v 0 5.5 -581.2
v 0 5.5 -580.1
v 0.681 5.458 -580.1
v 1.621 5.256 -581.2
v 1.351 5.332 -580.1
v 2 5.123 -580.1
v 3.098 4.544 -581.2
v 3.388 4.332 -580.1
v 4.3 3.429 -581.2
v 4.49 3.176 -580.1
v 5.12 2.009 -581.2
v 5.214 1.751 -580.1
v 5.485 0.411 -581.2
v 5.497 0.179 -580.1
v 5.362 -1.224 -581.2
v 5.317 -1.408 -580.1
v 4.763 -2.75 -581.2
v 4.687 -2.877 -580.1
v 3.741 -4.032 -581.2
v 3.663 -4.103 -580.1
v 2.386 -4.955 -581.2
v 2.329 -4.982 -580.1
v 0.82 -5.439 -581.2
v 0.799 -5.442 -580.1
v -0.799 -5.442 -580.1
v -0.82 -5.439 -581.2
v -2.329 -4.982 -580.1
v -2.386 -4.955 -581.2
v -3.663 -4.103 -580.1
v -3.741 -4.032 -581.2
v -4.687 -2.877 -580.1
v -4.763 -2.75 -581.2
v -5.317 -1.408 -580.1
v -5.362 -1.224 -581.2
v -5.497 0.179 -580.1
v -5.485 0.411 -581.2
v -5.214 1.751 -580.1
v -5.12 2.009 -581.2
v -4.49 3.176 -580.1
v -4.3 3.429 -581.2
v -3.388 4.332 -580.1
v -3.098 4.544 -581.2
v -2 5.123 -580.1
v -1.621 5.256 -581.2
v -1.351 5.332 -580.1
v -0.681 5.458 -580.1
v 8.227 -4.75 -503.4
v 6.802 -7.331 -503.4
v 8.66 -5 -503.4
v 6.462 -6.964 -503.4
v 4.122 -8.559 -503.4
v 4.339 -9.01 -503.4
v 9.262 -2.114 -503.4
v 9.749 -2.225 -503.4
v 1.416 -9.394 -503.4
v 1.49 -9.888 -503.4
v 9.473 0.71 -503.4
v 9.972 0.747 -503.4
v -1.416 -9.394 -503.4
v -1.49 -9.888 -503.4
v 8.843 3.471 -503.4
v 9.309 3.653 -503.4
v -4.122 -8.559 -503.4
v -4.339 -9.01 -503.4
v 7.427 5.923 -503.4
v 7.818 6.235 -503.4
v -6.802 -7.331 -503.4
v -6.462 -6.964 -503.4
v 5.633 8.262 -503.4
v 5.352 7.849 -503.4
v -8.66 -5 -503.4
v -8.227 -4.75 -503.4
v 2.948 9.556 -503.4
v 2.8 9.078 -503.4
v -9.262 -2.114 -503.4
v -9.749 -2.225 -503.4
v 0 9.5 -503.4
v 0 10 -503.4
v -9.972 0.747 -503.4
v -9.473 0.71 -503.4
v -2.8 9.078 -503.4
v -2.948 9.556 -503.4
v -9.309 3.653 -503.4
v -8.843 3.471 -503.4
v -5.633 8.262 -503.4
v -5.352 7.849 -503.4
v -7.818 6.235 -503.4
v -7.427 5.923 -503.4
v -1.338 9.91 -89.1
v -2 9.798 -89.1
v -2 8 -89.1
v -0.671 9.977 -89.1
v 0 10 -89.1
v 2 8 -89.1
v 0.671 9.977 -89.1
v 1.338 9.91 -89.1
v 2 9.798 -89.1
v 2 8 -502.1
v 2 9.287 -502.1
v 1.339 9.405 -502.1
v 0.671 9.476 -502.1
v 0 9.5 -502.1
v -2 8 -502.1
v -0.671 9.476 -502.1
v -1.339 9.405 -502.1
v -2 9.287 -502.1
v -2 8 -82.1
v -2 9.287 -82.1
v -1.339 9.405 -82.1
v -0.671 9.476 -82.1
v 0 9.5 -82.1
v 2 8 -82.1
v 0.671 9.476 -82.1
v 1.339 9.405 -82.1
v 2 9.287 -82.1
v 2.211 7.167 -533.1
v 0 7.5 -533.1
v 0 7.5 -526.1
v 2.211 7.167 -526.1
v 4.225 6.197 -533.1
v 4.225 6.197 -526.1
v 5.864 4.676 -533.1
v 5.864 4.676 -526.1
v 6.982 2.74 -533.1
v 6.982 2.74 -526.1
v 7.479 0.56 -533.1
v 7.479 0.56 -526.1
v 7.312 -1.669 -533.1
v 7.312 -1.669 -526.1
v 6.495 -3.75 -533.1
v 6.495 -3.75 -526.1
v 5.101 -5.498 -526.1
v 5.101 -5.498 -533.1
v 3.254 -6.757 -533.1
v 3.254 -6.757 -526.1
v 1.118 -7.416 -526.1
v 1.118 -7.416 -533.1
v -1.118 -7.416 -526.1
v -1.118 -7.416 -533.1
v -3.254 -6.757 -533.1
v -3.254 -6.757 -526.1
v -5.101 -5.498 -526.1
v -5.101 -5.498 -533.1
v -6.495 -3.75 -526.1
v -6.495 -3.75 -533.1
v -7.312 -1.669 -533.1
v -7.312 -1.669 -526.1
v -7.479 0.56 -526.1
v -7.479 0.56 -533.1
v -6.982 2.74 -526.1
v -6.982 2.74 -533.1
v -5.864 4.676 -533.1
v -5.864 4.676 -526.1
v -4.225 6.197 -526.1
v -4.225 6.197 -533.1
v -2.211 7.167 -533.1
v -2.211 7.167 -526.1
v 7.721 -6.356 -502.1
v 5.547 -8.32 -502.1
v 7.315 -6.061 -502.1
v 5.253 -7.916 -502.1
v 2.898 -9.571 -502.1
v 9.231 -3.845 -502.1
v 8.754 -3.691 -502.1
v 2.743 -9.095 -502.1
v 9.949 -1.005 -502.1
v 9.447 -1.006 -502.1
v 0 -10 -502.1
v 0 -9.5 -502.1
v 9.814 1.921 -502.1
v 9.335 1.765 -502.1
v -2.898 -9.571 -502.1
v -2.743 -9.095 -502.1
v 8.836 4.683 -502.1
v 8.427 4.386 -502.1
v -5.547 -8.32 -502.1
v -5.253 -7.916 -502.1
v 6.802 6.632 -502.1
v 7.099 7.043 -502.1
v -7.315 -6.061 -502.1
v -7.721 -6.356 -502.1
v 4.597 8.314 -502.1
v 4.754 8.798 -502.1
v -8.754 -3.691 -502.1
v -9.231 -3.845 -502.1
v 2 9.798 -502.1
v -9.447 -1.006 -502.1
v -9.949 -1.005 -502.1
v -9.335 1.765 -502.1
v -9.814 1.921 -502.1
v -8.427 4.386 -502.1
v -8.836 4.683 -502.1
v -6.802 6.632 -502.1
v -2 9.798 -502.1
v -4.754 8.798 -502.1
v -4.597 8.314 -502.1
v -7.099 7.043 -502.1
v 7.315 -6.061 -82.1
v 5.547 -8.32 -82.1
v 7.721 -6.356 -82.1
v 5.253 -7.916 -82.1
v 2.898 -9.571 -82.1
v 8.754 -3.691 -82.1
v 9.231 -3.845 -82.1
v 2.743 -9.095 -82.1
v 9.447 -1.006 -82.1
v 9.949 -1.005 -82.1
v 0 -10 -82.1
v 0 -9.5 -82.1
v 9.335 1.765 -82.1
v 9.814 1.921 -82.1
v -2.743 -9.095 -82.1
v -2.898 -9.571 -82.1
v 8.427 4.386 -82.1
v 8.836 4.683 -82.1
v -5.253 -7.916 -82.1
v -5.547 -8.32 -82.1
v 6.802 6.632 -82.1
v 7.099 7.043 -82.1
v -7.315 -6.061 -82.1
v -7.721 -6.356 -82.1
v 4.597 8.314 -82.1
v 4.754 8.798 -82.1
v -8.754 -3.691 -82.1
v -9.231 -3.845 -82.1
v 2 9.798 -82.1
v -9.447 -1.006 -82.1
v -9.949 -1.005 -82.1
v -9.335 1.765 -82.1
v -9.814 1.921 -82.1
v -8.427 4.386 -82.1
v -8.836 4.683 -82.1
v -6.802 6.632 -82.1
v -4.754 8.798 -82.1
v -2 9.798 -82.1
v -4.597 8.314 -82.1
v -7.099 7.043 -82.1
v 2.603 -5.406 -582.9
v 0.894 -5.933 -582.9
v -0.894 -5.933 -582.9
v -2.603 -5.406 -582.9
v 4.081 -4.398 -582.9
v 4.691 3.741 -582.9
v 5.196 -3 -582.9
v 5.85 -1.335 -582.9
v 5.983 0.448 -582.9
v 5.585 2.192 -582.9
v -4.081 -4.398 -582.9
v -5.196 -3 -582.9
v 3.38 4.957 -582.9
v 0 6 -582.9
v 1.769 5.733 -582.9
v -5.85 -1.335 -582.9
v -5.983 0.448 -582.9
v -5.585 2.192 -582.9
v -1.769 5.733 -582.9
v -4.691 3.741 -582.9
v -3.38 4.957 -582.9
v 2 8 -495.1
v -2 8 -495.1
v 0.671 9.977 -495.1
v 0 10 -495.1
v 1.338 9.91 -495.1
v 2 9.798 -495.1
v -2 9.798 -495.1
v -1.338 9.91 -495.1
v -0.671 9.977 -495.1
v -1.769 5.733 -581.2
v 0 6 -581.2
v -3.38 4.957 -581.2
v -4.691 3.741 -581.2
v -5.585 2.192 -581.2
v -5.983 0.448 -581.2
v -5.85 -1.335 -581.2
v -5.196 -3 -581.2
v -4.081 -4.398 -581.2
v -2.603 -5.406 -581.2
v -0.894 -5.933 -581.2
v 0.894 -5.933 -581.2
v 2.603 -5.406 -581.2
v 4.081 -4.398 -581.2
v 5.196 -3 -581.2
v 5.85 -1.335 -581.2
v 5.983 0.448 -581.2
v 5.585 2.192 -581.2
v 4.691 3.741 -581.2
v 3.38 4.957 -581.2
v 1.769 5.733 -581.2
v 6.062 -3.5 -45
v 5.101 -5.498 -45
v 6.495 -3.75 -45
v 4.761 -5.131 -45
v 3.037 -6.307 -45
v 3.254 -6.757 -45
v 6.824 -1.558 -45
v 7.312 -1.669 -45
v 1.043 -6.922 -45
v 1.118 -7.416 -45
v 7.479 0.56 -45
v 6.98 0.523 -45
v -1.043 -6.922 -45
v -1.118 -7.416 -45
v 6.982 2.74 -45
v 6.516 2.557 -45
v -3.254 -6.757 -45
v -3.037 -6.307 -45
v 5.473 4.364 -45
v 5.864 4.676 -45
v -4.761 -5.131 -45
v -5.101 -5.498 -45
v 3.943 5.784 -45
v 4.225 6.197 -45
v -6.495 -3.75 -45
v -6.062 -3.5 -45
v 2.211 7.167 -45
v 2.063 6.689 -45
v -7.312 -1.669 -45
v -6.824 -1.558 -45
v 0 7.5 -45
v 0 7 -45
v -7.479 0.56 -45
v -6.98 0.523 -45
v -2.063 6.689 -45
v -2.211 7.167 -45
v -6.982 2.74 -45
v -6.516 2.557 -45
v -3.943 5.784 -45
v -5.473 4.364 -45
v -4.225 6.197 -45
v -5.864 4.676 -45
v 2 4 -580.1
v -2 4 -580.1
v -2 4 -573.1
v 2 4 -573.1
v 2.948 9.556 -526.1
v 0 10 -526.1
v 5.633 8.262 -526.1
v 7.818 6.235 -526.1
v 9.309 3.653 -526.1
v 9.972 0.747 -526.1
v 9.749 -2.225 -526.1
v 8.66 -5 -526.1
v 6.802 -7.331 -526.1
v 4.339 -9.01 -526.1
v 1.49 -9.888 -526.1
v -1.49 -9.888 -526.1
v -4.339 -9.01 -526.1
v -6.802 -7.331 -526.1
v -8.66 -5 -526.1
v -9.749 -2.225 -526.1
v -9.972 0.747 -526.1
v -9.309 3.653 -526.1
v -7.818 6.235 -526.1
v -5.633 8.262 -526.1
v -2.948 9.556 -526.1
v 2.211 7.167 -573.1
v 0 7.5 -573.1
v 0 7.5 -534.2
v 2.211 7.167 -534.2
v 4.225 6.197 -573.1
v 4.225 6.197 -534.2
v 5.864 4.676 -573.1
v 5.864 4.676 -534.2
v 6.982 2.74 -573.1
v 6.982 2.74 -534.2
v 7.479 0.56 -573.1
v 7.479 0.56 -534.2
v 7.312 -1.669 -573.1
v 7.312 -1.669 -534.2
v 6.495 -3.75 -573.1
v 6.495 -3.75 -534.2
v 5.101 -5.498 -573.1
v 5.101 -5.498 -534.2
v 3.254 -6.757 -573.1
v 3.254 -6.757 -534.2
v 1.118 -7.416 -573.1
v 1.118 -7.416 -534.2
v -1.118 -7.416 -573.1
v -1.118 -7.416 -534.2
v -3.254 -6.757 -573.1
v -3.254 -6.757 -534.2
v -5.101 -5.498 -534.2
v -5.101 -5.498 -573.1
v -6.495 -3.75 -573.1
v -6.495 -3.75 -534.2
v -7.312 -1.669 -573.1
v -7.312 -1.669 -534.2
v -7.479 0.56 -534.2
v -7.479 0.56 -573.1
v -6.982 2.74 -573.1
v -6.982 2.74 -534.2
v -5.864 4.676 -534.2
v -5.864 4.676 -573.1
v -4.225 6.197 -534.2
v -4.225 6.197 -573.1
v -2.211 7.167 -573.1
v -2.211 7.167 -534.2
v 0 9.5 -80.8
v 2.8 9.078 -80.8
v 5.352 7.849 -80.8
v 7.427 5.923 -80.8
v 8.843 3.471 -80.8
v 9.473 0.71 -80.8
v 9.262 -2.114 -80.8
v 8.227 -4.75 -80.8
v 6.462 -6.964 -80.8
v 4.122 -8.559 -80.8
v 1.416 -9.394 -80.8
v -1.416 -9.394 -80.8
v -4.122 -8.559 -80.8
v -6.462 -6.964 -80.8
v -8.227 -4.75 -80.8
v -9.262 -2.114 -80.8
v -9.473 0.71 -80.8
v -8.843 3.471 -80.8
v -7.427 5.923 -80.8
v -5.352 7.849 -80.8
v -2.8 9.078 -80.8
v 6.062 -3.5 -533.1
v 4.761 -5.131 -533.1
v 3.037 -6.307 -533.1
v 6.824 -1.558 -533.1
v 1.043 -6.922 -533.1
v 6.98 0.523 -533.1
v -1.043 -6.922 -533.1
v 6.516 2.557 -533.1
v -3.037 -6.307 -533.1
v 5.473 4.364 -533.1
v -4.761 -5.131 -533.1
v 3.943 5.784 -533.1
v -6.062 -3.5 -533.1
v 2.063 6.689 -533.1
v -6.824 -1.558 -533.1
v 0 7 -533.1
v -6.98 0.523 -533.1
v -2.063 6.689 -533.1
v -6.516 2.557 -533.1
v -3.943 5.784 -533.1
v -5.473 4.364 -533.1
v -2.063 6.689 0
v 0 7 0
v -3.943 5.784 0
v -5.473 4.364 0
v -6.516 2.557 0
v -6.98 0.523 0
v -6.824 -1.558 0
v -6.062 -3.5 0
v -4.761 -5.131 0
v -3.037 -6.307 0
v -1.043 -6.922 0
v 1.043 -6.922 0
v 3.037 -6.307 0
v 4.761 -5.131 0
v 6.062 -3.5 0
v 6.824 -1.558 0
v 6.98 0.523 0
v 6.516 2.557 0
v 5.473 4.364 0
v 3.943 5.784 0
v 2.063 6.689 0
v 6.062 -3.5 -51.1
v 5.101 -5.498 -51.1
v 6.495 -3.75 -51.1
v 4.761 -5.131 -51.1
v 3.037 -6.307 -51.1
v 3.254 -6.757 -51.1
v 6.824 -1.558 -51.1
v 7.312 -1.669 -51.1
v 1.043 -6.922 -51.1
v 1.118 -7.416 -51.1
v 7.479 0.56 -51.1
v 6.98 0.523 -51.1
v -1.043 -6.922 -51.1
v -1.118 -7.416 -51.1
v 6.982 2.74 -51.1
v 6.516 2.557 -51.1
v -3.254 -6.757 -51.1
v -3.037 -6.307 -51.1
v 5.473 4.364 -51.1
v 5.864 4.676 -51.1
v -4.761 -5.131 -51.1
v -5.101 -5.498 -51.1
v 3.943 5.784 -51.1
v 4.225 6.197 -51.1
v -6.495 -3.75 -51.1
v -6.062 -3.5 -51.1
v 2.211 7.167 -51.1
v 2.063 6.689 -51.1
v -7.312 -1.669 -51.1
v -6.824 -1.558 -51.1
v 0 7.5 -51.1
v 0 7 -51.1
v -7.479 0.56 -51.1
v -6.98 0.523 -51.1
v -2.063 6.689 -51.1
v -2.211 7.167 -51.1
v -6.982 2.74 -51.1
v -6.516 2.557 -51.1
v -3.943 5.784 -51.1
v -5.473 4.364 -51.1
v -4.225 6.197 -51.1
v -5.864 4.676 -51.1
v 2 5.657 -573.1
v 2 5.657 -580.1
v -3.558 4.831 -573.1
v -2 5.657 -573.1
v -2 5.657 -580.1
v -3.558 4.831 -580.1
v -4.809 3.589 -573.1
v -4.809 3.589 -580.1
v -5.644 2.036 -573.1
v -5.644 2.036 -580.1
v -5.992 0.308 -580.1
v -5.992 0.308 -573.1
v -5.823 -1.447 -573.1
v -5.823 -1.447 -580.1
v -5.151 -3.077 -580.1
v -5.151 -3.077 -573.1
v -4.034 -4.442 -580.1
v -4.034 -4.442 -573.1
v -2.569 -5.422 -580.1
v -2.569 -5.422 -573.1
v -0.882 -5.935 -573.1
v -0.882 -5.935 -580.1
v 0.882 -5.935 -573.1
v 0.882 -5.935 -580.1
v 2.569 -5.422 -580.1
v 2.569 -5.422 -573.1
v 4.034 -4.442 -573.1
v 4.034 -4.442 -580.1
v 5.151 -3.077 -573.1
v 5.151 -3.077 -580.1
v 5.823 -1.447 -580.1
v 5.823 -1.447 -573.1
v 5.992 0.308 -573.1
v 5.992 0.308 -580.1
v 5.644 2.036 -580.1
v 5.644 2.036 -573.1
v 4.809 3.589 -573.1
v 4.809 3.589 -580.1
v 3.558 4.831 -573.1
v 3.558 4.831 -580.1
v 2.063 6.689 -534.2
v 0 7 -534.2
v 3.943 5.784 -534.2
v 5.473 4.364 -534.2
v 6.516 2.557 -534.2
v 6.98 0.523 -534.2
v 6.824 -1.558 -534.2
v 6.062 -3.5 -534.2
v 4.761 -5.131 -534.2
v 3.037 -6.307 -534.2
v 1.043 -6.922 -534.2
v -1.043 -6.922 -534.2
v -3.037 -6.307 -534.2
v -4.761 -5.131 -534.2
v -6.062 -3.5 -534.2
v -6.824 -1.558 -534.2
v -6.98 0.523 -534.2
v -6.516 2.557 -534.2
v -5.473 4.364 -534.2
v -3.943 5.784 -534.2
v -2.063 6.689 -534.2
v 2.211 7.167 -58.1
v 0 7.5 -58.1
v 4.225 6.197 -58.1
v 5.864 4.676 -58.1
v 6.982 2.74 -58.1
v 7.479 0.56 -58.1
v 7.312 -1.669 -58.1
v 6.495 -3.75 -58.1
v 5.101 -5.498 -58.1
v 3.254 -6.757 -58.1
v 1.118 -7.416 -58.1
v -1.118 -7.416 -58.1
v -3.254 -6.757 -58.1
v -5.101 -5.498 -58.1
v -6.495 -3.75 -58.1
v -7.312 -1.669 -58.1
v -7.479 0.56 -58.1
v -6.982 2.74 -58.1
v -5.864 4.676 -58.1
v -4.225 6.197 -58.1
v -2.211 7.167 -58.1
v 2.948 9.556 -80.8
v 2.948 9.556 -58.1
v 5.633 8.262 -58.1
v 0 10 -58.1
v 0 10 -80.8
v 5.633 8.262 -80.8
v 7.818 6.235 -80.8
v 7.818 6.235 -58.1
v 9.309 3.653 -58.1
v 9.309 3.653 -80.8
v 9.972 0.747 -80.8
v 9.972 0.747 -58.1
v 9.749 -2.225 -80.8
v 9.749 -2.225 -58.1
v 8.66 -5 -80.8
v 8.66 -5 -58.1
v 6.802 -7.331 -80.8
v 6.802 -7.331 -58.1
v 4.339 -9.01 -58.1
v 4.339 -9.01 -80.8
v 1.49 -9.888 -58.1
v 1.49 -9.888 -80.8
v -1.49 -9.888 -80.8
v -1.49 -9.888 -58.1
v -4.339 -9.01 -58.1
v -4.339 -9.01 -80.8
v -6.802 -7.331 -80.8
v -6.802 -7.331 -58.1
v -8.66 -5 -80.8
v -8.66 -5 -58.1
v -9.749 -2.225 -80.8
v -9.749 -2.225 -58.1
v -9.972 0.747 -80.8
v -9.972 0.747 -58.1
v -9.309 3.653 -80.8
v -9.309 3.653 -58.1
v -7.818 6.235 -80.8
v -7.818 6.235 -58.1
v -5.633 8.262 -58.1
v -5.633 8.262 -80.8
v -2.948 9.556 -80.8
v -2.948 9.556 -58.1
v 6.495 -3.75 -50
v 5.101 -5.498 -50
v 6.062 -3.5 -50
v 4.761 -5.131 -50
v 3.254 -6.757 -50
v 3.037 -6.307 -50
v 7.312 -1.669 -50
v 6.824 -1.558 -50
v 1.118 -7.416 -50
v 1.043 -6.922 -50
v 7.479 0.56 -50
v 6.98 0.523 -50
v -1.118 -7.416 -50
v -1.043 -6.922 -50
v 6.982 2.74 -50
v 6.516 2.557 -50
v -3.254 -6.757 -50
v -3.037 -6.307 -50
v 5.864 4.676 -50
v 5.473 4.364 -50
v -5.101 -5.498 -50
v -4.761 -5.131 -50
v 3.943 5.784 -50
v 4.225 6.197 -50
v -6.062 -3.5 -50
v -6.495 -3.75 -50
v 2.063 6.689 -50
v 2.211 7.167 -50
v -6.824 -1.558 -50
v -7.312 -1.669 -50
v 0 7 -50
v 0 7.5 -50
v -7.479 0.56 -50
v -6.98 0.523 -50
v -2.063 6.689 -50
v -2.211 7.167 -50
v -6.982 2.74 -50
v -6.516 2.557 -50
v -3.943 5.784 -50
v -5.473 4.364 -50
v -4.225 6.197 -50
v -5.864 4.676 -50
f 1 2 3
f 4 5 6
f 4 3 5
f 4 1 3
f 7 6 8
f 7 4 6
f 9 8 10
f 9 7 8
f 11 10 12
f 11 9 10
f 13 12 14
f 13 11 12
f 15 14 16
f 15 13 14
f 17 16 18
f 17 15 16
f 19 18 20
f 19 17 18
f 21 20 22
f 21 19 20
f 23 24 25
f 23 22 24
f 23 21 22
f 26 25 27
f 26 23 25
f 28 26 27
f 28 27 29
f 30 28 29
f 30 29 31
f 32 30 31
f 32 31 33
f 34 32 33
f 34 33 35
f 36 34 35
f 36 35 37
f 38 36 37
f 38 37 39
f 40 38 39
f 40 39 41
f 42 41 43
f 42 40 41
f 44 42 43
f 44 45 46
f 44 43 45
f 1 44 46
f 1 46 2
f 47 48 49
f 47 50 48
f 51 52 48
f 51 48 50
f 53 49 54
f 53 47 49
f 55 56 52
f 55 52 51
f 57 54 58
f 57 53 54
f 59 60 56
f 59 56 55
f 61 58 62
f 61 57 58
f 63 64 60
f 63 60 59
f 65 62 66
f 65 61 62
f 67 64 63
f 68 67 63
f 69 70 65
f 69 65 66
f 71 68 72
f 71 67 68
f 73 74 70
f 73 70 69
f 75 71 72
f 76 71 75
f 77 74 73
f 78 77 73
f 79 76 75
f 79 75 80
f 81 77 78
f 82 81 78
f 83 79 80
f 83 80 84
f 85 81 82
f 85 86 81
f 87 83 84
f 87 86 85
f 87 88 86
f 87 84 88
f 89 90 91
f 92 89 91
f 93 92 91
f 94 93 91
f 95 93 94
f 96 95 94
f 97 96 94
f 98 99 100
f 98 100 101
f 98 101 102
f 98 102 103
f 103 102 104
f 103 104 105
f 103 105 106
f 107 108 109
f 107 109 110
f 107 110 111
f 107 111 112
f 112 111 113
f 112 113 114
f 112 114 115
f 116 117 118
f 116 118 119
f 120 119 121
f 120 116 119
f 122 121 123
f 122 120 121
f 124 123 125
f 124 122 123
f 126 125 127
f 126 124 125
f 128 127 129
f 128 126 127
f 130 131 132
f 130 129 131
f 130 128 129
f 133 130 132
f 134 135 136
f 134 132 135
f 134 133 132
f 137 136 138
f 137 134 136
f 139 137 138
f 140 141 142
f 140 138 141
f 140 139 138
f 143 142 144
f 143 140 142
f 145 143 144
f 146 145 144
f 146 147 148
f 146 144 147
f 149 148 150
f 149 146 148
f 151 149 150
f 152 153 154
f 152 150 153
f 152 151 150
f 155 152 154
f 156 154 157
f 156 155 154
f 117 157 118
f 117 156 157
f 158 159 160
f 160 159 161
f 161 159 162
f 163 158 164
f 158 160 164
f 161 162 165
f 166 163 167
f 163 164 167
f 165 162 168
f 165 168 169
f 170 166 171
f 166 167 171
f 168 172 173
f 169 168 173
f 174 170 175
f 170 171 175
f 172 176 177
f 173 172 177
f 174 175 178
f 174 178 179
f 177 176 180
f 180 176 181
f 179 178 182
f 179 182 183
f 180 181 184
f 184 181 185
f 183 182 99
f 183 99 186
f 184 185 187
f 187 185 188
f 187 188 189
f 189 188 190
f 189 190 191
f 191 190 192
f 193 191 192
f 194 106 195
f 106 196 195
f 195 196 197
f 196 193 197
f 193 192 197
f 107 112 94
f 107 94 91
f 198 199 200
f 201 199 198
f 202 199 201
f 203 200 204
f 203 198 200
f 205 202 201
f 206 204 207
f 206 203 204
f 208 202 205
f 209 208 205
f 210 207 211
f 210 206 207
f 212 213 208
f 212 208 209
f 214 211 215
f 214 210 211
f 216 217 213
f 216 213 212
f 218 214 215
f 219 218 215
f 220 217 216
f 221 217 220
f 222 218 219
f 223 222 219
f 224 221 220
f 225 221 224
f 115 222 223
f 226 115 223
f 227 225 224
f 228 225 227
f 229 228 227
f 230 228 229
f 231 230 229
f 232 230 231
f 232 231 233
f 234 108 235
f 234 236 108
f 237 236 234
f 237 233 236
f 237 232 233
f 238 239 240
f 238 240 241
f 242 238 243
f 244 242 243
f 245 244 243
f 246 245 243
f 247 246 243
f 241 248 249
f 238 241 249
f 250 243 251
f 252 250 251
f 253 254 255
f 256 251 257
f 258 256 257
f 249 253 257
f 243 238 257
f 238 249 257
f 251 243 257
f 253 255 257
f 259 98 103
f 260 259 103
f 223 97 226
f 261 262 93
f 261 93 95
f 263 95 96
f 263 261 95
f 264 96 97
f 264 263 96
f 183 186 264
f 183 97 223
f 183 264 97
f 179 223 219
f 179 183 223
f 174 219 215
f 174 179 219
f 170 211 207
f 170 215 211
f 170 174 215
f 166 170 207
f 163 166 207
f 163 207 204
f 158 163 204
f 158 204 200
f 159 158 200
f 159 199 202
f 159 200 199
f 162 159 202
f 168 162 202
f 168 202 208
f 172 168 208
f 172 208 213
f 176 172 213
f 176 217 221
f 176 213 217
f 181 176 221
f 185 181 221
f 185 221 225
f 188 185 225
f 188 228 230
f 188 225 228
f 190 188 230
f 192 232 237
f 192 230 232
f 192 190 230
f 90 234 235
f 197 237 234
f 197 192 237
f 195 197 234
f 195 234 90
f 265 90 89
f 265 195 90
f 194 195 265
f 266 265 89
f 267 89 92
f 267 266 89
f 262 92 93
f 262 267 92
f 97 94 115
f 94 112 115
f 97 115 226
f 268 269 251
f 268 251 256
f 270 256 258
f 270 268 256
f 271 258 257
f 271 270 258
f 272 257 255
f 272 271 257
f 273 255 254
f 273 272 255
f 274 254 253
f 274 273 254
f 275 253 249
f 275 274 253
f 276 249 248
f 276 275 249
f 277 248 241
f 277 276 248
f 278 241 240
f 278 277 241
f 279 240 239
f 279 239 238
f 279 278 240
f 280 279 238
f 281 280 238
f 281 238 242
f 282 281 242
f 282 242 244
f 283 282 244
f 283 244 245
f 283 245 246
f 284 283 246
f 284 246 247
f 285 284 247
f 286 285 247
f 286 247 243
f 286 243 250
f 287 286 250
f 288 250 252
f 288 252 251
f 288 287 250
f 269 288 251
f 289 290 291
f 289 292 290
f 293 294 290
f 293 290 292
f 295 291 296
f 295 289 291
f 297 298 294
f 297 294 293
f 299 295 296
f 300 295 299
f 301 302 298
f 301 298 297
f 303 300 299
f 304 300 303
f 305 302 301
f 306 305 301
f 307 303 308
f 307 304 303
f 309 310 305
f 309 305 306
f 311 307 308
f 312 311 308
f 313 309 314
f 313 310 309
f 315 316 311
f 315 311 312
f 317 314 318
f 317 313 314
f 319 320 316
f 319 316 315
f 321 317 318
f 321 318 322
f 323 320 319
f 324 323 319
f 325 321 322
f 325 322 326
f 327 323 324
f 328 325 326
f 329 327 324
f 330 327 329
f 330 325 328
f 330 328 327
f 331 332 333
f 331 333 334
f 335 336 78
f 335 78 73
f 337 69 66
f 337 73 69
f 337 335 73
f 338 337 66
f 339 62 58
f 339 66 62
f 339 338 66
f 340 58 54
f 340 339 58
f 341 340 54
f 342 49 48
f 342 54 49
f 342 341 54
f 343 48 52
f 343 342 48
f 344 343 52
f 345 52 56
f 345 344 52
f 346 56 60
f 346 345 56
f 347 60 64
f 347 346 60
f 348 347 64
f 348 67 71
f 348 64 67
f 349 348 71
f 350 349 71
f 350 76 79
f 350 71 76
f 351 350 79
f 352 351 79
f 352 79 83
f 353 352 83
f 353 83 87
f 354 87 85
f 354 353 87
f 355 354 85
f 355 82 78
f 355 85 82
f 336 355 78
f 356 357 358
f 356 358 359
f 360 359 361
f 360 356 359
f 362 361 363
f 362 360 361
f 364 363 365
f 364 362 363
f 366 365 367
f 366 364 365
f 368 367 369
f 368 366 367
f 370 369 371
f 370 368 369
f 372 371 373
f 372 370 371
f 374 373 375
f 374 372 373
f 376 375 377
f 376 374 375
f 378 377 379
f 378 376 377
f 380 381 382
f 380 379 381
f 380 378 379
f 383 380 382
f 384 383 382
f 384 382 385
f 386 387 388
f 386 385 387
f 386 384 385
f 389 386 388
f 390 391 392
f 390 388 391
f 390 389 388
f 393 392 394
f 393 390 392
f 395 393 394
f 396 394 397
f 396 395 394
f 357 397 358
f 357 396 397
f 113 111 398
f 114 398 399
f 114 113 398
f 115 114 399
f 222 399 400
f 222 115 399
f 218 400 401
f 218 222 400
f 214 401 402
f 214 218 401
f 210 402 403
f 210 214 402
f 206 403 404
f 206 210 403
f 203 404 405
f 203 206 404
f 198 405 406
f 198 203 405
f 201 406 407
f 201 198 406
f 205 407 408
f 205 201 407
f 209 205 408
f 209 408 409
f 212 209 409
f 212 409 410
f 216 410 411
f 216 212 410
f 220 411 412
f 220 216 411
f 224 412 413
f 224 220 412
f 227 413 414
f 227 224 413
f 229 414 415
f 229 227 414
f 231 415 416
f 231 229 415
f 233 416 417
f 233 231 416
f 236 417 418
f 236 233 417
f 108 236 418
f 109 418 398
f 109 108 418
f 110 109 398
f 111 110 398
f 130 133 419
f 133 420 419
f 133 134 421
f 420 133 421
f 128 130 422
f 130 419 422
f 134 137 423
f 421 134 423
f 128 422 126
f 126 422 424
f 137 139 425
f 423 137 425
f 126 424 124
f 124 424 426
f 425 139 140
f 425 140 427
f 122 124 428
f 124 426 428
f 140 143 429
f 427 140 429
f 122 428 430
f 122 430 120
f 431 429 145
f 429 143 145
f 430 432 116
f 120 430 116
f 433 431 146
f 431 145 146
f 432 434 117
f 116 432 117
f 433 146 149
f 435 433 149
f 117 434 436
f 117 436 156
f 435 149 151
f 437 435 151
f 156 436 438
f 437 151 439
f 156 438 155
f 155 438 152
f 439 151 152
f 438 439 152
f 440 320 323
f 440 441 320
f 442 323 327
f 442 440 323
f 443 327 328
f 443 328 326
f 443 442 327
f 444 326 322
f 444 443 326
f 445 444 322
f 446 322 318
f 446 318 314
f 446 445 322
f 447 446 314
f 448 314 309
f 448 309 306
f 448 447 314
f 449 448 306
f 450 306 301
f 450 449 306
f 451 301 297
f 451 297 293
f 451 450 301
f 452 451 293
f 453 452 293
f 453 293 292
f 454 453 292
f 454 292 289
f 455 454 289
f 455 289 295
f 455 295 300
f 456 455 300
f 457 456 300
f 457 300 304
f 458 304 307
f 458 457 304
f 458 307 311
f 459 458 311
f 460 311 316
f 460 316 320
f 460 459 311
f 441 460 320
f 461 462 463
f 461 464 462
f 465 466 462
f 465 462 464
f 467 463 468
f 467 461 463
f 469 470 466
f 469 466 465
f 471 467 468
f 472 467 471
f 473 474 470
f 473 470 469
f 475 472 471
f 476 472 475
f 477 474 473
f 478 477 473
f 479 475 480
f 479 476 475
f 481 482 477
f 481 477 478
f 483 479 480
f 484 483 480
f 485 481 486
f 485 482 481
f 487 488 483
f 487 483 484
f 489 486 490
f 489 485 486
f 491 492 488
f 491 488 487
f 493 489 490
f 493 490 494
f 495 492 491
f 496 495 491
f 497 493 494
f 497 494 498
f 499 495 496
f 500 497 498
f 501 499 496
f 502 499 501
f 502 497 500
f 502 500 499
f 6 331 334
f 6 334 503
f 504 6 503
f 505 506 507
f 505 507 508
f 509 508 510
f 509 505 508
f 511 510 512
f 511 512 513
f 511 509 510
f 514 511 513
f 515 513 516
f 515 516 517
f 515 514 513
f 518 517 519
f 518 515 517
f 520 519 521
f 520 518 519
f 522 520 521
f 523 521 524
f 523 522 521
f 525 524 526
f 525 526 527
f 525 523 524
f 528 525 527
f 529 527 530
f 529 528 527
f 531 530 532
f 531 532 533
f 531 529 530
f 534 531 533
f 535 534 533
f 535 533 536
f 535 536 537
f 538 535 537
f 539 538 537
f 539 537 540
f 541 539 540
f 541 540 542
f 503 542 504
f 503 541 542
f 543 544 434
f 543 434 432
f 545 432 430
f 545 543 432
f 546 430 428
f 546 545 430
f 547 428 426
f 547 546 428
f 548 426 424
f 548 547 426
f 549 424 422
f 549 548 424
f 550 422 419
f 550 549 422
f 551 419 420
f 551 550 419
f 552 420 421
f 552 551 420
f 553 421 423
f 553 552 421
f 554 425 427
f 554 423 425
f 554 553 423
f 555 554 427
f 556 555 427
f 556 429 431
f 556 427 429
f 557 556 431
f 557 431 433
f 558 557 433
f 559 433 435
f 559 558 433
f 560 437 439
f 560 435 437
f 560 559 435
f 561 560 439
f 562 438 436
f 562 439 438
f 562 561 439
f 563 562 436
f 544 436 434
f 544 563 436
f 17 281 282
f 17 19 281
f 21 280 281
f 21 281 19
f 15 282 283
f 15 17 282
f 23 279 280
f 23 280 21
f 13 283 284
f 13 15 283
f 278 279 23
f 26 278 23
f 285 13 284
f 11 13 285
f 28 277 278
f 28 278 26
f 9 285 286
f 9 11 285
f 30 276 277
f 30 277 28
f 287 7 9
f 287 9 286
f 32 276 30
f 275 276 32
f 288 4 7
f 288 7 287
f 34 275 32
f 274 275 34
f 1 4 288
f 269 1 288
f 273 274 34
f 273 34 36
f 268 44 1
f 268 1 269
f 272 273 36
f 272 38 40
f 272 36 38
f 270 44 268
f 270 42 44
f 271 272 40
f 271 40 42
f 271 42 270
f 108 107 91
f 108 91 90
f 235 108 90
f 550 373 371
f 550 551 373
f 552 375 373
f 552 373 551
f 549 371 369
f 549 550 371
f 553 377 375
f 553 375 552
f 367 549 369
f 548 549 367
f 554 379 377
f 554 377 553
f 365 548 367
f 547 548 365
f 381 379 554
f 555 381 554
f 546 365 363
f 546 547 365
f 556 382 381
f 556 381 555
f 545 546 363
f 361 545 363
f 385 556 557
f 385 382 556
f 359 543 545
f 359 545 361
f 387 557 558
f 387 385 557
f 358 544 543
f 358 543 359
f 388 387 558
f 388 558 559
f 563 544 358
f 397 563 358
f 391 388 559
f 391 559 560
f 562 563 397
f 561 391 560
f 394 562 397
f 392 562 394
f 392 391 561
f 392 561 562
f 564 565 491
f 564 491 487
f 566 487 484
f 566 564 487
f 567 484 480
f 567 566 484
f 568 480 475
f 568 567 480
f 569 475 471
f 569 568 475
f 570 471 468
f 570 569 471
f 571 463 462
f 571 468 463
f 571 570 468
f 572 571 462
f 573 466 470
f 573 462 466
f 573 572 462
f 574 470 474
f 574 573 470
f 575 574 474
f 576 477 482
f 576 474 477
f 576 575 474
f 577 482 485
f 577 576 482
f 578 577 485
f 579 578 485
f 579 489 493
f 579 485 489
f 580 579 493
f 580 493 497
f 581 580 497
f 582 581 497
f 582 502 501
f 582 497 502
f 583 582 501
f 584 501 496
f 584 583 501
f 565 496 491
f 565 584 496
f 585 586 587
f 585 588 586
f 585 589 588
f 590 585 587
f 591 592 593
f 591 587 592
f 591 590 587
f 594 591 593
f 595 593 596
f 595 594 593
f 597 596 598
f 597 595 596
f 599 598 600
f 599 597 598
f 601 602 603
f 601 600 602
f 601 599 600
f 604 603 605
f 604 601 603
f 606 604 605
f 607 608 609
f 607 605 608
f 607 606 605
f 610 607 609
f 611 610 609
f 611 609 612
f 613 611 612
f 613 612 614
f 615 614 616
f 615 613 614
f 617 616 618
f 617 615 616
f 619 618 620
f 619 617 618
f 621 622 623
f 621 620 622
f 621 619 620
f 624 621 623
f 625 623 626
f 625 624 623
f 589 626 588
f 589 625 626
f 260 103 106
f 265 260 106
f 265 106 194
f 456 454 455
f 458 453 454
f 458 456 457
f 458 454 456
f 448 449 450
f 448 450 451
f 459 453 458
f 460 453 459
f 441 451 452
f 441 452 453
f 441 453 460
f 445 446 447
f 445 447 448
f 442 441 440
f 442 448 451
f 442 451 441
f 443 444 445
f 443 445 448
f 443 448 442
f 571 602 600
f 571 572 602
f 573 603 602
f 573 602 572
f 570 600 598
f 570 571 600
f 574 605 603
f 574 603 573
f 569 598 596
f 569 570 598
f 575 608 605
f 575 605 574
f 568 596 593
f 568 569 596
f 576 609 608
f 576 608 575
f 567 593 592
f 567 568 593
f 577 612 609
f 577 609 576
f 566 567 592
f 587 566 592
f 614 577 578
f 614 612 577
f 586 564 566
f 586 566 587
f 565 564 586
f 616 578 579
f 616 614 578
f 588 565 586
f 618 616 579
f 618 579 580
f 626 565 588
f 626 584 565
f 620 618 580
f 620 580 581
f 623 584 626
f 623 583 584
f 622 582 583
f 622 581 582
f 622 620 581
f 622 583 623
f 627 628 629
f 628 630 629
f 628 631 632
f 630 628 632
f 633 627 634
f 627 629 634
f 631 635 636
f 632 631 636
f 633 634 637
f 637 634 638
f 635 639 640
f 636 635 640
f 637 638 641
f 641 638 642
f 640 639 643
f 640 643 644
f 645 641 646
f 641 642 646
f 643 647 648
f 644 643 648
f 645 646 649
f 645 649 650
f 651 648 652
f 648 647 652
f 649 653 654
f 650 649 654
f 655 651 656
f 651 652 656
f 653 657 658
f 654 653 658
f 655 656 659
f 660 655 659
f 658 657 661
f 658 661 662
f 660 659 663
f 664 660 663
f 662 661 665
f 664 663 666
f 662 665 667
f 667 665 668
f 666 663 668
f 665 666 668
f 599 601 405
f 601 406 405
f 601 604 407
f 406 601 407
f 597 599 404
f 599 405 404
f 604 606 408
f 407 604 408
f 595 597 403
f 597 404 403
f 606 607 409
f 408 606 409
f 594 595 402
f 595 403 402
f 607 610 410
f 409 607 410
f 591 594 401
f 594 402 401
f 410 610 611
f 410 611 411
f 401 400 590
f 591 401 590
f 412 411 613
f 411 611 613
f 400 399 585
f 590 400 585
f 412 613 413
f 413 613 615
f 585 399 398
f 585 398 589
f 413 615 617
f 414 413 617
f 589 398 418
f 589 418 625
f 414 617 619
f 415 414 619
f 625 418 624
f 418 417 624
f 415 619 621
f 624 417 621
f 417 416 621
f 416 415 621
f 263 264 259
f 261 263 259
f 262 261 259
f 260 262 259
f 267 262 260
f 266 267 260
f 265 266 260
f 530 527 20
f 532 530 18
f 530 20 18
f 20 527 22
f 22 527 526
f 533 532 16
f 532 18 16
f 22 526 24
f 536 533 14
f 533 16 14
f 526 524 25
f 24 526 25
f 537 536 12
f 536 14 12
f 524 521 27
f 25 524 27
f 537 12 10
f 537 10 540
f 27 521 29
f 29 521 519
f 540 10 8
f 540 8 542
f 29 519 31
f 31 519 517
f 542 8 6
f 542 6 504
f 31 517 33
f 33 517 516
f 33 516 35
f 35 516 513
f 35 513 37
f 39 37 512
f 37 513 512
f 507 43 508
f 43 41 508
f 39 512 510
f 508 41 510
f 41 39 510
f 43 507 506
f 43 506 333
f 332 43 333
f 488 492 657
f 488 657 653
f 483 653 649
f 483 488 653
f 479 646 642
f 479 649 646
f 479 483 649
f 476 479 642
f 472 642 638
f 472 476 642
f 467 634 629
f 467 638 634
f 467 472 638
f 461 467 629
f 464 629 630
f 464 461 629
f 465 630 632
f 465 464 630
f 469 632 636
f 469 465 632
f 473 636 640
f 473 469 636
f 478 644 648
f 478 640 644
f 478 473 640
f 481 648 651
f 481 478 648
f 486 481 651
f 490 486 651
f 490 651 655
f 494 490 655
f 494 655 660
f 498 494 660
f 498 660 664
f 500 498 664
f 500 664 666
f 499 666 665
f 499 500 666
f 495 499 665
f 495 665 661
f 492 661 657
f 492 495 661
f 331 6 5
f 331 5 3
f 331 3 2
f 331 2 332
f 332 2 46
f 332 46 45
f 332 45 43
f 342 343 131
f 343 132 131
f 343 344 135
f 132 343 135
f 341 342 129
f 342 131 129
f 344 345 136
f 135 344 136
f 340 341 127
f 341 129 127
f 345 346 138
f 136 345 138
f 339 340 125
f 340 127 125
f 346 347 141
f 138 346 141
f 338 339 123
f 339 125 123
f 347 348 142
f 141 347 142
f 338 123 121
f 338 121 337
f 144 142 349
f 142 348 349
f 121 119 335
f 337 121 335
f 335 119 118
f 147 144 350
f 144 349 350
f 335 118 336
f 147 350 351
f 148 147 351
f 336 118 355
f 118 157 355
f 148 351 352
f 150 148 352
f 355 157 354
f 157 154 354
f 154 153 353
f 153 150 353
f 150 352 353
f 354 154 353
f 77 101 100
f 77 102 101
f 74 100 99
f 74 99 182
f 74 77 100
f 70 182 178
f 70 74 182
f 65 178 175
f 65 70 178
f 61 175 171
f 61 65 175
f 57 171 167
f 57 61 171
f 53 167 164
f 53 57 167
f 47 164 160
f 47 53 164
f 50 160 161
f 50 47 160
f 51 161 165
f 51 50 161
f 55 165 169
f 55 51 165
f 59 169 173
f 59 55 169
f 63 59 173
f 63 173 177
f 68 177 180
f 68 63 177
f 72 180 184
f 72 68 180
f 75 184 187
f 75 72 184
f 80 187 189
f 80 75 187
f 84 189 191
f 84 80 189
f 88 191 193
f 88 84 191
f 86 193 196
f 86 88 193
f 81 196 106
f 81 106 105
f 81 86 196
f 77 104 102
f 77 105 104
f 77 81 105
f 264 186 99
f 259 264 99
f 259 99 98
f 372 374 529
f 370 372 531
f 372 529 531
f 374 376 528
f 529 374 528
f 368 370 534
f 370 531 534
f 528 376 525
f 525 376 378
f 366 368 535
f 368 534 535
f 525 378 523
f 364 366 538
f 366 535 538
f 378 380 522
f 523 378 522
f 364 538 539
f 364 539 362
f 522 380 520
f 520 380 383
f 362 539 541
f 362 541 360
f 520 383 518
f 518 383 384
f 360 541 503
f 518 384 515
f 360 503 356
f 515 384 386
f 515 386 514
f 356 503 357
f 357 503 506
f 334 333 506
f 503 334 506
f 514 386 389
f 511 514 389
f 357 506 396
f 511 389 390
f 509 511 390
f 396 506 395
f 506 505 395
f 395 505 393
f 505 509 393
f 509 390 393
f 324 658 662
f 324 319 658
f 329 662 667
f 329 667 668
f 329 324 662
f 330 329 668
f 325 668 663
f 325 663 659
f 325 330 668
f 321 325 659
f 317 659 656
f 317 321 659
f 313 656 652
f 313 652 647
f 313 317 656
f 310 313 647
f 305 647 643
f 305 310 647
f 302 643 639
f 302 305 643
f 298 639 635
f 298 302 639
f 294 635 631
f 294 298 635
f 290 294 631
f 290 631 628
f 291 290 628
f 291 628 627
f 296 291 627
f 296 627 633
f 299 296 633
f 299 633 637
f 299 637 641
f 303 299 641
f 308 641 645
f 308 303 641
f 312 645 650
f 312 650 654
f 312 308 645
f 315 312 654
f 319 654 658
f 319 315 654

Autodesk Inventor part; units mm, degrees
ref_plane "YZ Plane" through (0, 0, 0) normal (1, 0, 0) x (0, 1, 0)
ref_plane "XZ Plane" through (0, 0, 0) normal (0, 1, 0) x (-1, 0, 0)
ref_plane "XY Plane" through (0, 0, 0) normal (0, 0, 1) x (1, 0, 0)
sketch "Sketch1" plane through (0, 0, 0) normal (1, 0, 0) x (0, 1, 0)
  line L0 (0, 0) -> (7, 0)
  line L1 (7.5, -50) -> (7, -50)
  line L2 (7, -50) -> (7, -51.1)
  line L3 (7, -51.1) -> (7.5, -51.1)
  line L4 (7.5, -51.1) -> (7.5, -58.1)
  line L5 (7.5, -58.1) -> (10, -58.1)
  line L6 (10, -58.1) -> (10, -80.8)
  line L7 (10, -80.8) -> (9.5, -80.8)
  line L8 (9.5, -80.8) -> (9.5, -82.1)
  line L9 (9.5, -82.1) -> (10, -82.1)
  line L10 (10, -82.1) -> (10, -502.1)
  line L11 (10, -502.1) -> (9.5, -502.1)
  line L12 (9.5, -502.1) -> (9.5, -503.4)
  line L13 (9.5, -503.4) -> (10, -503.4)
  line L14 (10, -503.4) -> (10, -526.1)
  line L15 (10, -526.1) -> (7.5, -526.1)
  line L16 (7.5, -526.1) -> (7.5, -533.1)
  line L17 (7.5, -533.1) -> (7, -533.1)
  line L18 (7, -533.1) -> (7, -534.2)
  line L19 (7, -534.2) -> (7.5, -534.2)
  line L20 (7.5, -534.2) -> (7.5, -573.1)
  line L21 (7.5, -573.1) -> (0, -573.1)
  line L22 (0, -573.1) -> (0, 0)
  line L23 (6, -573.1) -> (6, -582.9) construction
  line L24 (6, -582.9) -> (0, -582.9)
  line L25 (0, -582.9) -> (0, -573.1)
  line L26 (6, -580.1) -> (5.5, -580.1)
  line L27 (5.5, -580.1) -> (5.5, -581.2)
  line L28 (5.5, -581.2) -> (6, -581.2)
  line L29 (6, -582.9) -> (6, -581.2)
  line L30 (6, -580.1) -> (6, -573.1)
  line L31 (7.5, -50) -> (7.5, -45)
  line L32 (7.5, -45) -> (7, -45)
  line L33 (7, -45) -> (7, 0)
  line L34 (0, 0) -> (7, 0)
  point P0 (8.75, -526.1)
  point P1 (9.75, -82.1)
  point P2 (9.75, -502.1)
  point P3 (7.5, -47.5)
  point P4 (7, -50.55)
  dimension "d15" = 50
  dimension "d16" = 1.1
  dimension "d17" = 7
  dimension "d18" = 10
  dimension "d19" = 0.5
  dimension "d20" = 1.3
  dimension "d21" = 1.3
  dimension "d22" = 7.5
  dimension "d23" = 0.5
  dimension "d24" = 1.1
  dimension "d25" = 7
  dimension "d26" = 468
  dimension "d27" = 47
  dimension "d28" = 420
  dimension "d29" = 24
  dimension "d32" = 6
  dimension "d33" = 0.5
  dimension "d34" = 7
  dimension "d35" = 1.1
  dimension "d36" = 1.7
  dimension "d52" = 5
  dimension "d53" = 7
  dimension "d54" = 7.5
  dimension "d55" = 7
  dimension "d56" = 7.5
revolve "Revolution1" add sketch "Sketch1" angle 360 about axis through (0, 0, -573.1) along (0, 0, 1)
sketch "Sketch2" plane through (0, 0, -580.1) normal (0, 0, -1) x (-1, 0, 0)
  circle A0 centre (0, 0) radius 6 projected
  circle A1 centre (0, 0) radius 6 projected
  line L0 (0, 6) -> (2, 6)
  line L1 (2, 6) -> (2, 4)
  line L2 (2, 4) -> (-2, 4)
  line L3 (-2, 4) -> (-2, 6)
  line L4 (-2, 6) -> (0, 6)
  dimension "d37" = 2
  dimension "d38" = 2
  dimension "d39" = 4
extrude "Extrusion1" cut sketch "Sketch2" against normal blind 7 contours L1 L2 L3 A0 | A0 L0 L1 | L3 L4 A0 picked at (0, 4.6667)
sketch "Sketch3" plane through (0, 0, -502.1) normal (0, 0, -1) x (-1, 0, 0)
  circle A0 centre (0, 0) radius 10 projected
  line L0 (0, 10) -> (-2, 10)
  line L1 (-2, 10) -> (-2, 8)
  line L2 (-2, 8) -> (2, 8)
  line L3 (2, 8) -> (2, 10)
  line L4 (2, 10) -> (0, 10)
  point P0 (2, 9.798)
  point P1 (-2, 9.798)
  dimension "d42" = 2
  dimension "d43" = 2
  dimension "d44" = 4
extrude "Extrusion2" cut sketch "Sketch3" against normal blind 7 contours L3 L2 L1 A0 picked at (0, 8.6667)
sketch "Sketch4" plane through (0, 0, -82.1) normal (0, 0, 1) x (1, 0, 0)
  circle A0 centre (0, 0) radius 10 projected
  line L0 (0, 10) -> (-2, 10)
  line L1 (-2, 8) -> (-2, 9.2871) projected
  line L2 (-2, 10) -> (-2, 8)
  line L3 (2, 8) -> (-2, 8) projected
  line L4 (-2, 8) -> (2, 8)
  line L5 (2, 8) -> (2, 10)
  line L6 (2, 10) -> (0, 10)
  point P0 (0, 0)
  point P1 (-2, 9.2871)
  dimension "d47" = 2
  dimension "d48" = 2
  dimension "d49" = 4
extrude "Extrusion3" cut sketch "Sketch4" against normal blind 7 contours L5 L3 L1 L2 A0 | A0 L6 L5 | L2 L0 A0 picked at (0, 8.6667)
properties part number "P201" material "Steel, Mild"
